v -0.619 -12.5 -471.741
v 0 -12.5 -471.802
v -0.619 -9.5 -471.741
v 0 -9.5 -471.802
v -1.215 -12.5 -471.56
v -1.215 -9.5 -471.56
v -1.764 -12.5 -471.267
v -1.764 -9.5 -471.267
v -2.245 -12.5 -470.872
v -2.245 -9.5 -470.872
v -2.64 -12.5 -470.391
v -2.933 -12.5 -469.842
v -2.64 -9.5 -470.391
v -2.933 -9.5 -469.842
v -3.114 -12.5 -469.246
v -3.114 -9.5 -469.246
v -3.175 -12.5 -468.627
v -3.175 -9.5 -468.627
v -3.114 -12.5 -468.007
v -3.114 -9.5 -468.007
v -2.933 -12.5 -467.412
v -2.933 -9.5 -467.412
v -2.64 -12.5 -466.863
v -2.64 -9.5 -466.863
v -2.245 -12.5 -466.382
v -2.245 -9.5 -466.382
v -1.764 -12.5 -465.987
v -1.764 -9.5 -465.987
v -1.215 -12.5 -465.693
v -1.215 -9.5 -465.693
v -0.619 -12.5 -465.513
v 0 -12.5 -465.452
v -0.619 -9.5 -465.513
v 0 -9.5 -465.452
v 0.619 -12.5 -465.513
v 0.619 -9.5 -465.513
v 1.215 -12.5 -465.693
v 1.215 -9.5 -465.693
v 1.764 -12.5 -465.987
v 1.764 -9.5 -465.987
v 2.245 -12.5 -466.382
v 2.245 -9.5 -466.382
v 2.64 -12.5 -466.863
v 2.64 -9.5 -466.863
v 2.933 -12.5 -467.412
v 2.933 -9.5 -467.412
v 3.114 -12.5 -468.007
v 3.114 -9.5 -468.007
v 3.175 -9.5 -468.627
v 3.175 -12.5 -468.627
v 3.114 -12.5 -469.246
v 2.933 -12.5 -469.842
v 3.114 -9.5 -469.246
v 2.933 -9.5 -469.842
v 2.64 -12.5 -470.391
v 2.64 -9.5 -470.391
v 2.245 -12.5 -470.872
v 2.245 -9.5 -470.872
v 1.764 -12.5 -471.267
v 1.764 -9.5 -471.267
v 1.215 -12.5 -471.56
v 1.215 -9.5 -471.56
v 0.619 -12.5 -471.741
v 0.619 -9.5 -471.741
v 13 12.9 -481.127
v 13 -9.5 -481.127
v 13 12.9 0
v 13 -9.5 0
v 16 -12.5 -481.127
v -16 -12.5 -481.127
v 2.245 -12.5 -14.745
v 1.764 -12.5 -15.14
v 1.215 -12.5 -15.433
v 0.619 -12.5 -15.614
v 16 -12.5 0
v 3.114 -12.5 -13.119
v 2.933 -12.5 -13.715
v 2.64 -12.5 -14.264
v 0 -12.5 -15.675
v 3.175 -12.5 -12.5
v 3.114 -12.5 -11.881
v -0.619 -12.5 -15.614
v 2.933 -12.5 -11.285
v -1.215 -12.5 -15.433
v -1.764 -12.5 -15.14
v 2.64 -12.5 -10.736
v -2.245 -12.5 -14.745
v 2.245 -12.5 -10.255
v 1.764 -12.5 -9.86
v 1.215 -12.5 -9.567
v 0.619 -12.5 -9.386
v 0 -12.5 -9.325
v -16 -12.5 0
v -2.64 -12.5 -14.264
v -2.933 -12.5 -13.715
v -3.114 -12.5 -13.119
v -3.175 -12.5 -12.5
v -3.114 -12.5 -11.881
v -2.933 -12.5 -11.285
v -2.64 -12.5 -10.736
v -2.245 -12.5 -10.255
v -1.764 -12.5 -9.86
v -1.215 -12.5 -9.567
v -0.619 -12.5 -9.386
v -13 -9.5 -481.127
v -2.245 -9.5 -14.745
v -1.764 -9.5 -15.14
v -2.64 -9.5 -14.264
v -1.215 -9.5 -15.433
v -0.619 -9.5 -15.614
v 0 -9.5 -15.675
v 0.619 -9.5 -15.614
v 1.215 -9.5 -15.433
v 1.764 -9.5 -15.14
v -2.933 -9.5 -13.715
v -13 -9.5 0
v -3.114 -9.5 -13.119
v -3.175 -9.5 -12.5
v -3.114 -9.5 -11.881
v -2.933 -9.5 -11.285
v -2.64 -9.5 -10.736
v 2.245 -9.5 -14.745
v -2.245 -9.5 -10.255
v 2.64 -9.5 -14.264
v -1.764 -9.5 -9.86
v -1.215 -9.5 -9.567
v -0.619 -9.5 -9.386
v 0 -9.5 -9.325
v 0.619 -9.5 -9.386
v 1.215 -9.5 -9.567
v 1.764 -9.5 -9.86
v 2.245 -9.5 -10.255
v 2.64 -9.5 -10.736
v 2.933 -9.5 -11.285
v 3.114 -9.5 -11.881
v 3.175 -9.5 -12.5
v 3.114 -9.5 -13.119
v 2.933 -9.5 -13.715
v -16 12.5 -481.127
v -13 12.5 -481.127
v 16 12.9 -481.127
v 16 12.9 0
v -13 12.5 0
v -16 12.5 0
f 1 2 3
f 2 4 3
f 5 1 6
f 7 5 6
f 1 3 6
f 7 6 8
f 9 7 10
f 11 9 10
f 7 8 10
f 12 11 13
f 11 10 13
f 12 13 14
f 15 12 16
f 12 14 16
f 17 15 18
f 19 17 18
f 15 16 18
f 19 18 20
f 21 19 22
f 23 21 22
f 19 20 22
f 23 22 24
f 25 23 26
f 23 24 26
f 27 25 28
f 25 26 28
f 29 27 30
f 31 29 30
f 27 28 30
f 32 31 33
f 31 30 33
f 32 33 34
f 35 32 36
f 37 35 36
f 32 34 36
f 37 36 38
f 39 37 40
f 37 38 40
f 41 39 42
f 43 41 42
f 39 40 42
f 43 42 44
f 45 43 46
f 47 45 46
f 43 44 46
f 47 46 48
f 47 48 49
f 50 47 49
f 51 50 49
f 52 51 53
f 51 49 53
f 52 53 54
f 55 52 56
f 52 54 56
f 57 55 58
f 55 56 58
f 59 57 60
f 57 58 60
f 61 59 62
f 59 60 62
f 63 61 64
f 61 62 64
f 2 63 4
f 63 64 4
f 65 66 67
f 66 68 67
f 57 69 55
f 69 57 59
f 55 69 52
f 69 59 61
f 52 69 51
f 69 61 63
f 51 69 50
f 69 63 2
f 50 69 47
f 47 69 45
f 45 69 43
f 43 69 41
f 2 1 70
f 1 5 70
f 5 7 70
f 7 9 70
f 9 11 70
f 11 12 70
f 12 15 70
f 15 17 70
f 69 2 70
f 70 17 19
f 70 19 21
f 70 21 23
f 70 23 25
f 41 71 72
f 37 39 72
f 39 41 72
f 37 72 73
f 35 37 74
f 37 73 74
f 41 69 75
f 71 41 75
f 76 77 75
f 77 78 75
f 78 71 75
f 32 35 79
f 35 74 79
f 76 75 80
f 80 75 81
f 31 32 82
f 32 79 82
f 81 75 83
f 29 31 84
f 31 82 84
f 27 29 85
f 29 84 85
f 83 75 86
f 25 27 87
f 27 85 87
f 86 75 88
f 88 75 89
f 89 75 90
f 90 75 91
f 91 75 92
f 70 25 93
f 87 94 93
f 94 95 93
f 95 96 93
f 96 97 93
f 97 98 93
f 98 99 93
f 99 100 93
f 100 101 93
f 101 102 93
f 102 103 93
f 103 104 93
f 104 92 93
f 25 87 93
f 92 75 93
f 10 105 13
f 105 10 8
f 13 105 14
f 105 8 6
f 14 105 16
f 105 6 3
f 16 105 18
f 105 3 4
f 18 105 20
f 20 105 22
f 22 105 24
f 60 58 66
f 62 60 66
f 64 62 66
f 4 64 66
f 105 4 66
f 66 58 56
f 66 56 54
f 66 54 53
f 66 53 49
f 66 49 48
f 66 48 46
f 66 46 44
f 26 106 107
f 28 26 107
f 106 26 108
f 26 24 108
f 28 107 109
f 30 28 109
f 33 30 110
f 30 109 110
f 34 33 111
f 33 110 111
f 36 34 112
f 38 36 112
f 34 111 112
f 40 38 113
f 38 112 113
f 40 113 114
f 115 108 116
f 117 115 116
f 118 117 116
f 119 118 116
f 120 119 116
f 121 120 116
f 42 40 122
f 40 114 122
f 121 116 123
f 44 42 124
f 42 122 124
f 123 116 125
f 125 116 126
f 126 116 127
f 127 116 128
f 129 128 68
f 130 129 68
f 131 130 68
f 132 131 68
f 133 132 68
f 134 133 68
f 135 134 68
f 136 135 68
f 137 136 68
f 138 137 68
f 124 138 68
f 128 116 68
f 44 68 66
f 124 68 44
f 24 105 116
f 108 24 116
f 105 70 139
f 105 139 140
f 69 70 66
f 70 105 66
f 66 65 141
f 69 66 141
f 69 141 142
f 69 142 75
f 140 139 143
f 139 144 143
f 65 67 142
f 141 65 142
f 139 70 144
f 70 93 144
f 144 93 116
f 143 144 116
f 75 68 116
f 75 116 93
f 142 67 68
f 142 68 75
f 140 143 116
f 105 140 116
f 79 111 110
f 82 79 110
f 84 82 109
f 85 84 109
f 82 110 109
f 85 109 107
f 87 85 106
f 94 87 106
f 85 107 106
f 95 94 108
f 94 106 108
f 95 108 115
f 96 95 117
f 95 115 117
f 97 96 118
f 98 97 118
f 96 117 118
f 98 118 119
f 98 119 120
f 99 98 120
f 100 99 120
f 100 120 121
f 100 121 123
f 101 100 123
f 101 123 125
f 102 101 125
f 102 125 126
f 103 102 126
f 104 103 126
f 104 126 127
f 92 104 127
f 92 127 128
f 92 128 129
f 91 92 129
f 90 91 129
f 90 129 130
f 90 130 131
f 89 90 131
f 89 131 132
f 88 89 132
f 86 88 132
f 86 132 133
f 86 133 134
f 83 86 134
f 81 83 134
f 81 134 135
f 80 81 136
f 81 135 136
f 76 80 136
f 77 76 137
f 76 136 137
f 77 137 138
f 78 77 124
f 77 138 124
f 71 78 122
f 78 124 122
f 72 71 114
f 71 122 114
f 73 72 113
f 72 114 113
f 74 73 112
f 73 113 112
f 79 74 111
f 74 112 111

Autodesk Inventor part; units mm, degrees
ref_plane "YZ Plane" through (0, 0, 0) normal (1, 0, 0) x (0, 1, 0)
ref_plane "XZ Plane" through (0, 0, 0) normal (0, 1, 0) x (-1, 0, 0)
ref_plane "XY Plane" through (0, 0, 0) normal (0, 0, 1) x (1, 0, 0)
sketch "Sketch1" plane through (0, 0, 0) normal (0, 0, 1) x (1, 0, 0)
  line L0 (-16, 12.5) -> (-13, 12.5)
  line L1 (-13, 12.5) -> (-13, -9.5)
  line L2 (-13, -9.5) -> (13, -9.5)
  line L3 (13, -9.5) -> (13, 12.9)
  line L4 (13, 12.9) -> (16, 12.9)
  line L5 (16, 12.9) -> (16, -12.5)
  line L6 (16, -12.5) -> (-16, -12.5)
  line L7 (-16, -12.5) -> (-16, 12.5)
  point P0 (0, 0)
  dimension "d0" = 3
  dimension "d2" = 3
  dimension "d3" = 25
  dimension "d4" = 32
  dimension "d5" = 16
  dimension "d7" = 12.5
  dimension "d8" = 3
extrude "Extrusion1" add sketch "Sketch1" against normal blind 481.1268
sketch "Sketch4" plane through (-16, -12.5, 0) normal (0, -1, 0) x (1, 0, 0)
  line L0 (32, 0) -> (0, 0) projected
  line L1 (32, -481.1268) -> (0, -481.1268) projected
  line L2 (32, 0) -> (32, -481.1268) projected
  circle A0 centre (16, -12.5) radius 3.175
  circle A1 centre (16, -468.6268) radius 3.175
  point P0 (16, 0)
  dimension "d21" = 6.35
  dimension "d22" = 6.35
  dimension "d23" = 12.5
  dimension "d24" = 12.5
  dimension "d25" = 16
hole "Hole1" at (0, -12.5, -12.5) at (0, -12.5, -468.6268) direction (0, 1, 0) diameter 6.35 depth 3 tip angle 118
equation "\"d2\" = d0"
equation "\"d5\" = 0.5 * d4"
equation "\"d7\" = 0.5 * d3"
equation "\"d8\" = d0"
equation "\"d24\" = d23"
properties part number "19in c-channel"
